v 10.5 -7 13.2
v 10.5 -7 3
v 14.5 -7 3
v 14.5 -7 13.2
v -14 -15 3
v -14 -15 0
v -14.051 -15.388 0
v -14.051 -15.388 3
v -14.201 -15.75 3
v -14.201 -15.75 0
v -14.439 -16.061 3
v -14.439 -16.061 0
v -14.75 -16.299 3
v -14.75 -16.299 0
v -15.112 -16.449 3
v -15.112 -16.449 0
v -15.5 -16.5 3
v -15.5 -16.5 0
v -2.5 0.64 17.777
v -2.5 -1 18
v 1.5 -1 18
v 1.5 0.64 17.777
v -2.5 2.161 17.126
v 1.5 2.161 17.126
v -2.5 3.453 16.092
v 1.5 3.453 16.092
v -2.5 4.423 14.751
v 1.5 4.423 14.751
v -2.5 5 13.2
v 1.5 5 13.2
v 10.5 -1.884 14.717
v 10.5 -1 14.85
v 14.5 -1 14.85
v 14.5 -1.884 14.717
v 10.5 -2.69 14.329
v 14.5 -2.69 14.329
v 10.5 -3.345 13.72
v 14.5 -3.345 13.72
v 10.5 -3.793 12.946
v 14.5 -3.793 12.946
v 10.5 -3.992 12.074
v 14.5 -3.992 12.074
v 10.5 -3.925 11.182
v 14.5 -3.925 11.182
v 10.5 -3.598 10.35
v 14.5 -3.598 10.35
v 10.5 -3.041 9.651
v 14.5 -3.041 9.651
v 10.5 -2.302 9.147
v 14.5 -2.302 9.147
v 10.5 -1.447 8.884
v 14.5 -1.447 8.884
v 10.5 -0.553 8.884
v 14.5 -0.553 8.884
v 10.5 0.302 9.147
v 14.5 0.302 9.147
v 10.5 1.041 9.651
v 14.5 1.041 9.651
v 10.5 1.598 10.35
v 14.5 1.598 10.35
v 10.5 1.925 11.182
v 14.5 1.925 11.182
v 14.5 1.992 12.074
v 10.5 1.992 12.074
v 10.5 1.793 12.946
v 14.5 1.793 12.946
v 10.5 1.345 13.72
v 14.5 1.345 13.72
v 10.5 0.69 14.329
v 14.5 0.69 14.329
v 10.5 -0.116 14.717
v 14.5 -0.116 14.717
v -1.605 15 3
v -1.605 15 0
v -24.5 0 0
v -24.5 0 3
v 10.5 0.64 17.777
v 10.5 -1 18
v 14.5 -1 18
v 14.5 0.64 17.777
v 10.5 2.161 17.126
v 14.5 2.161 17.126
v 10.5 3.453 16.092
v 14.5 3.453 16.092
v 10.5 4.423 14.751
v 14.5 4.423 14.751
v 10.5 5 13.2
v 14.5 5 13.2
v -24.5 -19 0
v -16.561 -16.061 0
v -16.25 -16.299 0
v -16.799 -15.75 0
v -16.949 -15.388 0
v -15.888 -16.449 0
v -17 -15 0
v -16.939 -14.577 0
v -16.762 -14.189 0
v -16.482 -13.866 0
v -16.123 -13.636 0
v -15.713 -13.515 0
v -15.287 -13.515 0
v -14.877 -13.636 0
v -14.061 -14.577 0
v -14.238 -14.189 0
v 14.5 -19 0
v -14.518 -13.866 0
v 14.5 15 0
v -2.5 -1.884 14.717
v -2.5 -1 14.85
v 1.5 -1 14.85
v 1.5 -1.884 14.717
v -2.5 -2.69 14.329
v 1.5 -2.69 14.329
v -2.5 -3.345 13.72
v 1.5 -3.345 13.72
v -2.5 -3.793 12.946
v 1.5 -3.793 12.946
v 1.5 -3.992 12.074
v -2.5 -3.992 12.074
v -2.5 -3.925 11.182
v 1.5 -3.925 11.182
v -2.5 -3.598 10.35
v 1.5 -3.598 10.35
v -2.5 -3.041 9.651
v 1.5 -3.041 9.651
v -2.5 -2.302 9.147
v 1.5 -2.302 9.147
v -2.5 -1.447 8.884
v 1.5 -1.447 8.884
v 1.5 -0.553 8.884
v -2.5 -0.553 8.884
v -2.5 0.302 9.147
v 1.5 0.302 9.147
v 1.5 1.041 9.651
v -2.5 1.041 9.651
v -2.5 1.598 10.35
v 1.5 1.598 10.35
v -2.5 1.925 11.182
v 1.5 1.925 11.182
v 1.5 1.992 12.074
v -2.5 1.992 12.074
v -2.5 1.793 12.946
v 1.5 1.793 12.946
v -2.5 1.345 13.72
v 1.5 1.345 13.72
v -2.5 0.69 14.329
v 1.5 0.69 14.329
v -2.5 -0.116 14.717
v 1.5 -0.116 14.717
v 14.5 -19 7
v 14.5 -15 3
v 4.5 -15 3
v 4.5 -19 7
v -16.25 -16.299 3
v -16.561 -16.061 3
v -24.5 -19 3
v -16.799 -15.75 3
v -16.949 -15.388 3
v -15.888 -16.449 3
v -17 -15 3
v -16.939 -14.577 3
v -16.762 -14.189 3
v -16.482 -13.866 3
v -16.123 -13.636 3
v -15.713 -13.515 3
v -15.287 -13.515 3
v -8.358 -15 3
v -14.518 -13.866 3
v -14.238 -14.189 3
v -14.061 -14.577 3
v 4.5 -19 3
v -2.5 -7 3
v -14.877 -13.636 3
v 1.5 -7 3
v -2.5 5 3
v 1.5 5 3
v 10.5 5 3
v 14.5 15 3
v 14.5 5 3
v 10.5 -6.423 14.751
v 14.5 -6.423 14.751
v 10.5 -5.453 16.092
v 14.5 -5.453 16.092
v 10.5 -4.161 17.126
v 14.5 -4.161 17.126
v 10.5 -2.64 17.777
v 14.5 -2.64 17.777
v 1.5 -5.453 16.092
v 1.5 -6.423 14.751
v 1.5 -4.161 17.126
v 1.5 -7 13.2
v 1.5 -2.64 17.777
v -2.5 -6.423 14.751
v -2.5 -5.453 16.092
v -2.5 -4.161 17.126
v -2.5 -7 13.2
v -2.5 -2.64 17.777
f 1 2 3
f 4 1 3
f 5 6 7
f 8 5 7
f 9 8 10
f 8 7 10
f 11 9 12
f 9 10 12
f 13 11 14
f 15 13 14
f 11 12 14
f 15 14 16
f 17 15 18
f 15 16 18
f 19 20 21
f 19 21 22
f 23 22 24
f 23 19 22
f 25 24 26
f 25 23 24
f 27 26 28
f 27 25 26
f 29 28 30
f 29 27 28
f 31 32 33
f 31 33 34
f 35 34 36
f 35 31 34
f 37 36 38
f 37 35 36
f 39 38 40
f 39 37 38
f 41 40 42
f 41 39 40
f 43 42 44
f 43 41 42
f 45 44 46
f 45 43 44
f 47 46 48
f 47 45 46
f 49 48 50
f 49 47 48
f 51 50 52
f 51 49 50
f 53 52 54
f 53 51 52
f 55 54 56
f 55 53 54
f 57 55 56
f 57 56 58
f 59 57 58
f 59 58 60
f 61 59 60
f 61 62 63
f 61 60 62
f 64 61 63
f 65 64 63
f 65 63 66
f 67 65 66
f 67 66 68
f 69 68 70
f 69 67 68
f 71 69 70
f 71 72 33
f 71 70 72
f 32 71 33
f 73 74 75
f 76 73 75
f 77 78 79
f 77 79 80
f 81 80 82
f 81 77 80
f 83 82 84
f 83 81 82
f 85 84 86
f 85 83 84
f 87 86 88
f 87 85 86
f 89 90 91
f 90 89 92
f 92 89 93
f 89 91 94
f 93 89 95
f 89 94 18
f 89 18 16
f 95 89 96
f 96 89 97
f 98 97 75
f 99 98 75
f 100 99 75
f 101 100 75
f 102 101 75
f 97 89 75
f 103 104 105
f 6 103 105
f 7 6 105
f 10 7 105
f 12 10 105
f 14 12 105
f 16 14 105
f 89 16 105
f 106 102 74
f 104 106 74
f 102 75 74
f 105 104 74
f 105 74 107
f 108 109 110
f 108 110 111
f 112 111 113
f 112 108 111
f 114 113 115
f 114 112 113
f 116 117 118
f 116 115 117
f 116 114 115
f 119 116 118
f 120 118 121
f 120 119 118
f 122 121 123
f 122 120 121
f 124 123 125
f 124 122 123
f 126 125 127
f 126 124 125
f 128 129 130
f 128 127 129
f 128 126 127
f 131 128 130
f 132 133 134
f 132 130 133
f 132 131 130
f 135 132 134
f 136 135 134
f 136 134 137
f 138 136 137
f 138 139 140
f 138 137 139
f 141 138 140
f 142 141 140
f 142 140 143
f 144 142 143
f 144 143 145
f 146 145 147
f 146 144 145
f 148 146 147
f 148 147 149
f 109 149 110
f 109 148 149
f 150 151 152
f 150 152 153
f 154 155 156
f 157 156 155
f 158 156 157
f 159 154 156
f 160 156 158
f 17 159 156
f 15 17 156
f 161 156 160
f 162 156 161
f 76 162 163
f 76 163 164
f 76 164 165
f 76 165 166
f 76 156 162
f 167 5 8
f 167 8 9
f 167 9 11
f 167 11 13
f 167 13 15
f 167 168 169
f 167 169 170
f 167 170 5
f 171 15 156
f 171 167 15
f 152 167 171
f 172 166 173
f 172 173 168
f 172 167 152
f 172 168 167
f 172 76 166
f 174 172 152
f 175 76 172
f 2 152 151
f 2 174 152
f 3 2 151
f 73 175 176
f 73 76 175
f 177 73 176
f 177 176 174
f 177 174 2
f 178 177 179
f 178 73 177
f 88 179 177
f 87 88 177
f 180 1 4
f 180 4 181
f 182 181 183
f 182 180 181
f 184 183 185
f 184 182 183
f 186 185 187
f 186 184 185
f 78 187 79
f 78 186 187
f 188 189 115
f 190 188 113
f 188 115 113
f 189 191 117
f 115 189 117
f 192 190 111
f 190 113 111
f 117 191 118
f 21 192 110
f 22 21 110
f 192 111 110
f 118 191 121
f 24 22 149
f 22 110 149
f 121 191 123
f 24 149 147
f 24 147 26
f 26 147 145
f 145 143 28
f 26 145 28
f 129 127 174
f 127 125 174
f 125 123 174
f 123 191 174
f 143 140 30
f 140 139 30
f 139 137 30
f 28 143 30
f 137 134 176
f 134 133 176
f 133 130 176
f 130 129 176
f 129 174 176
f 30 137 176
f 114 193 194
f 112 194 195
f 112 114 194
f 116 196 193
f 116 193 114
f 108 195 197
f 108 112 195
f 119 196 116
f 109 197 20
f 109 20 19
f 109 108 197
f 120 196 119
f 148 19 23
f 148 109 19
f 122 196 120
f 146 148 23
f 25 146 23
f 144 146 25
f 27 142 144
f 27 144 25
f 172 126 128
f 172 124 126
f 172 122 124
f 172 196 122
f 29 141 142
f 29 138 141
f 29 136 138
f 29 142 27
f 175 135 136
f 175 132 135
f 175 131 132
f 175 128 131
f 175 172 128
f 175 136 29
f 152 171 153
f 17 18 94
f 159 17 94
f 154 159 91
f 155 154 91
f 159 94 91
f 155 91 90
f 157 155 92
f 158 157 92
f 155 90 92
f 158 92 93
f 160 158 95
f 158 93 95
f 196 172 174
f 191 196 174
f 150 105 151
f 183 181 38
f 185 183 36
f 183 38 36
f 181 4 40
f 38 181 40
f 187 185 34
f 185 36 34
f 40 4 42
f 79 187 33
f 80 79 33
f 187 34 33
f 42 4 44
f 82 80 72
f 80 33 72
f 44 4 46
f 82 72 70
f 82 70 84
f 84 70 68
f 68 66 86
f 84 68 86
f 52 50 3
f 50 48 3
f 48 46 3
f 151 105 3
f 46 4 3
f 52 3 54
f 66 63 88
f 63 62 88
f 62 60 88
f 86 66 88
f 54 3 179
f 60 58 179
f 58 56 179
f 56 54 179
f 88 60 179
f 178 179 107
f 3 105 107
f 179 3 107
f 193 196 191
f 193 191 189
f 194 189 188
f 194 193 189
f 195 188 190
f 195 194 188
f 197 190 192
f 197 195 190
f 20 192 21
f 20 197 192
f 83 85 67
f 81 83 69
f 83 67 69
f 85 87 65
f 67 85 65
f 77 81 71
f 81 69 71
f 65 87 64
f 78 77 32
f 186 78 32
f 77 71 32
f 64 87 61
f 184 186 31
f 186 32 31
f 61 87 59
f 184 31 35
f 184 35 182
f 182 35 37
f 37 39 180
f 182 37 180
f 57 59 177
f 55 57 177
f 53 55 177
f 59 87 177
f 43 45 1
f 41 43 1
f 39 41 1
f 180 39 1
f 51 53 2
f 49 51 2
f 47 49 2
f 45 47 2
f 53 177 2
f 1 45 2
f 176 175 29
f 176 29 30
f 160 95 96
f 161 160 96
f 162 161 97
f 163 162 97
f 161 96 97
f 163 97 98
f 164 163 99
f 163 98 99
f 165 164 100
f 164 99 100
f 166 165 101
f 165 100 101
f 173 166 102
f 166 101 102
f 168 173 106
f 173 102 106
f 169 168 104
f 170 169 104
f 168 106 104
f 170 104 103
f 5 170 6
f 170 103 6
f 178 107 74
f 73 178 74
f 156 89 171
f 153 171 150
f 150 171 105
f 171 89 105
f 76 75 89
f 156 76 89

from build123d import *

# Parameters (mm, degrees)
ESBO_O1_W                  = 10
ESBO_O1_H                  = 4
RESSALTO_EXTRUS_O1_DEPTH   = 3
ESBO_O1_8_W                = 4
ESBO_O1_8_H                = 12
RESSALTO_EXTRUS_O2_DEPTH   = 18
CORTE_EXTRUS_O1_DEPTH      = 47.968074263
CORTE_EXTRUS_O1_DEPTH_BACK = 47.968074263
ESBO_O2_R                  = 3
ESBO_O1_9_W                = 10
ESBO_O1_9_H                = 4
RESSALTO_EXTRUS_O3_DEPTH   = 8
CHANFRO1_SIZE              = 5


with BuildPart() as part:
    # Esboço1 → Ressalto-extrusão1 (new body)
    # profile 1 of 2: a face of its own
    with BuildSketch(Plane.XY):
        Polygon((-24.5, -15), (-24.5, -19), (-15.5, -19), (4.5, -19), (4.5, -15), (14.5, -15), (14.5, -7), (10.5, -7), (10.5, 5), (14.5, 5), (14.5, 15), (1.5, 15), (-1.605263158, 15), (-24.5, 0), align=None)
        with BuildLine():
            ThreePointArc((-15.5, -16.5), (-16.560660172, -16.060660172), (-17, -15))
            ThreePointArc((-17, -15), (-15.5, -13.5), (-14, -15))
            ThreePointArc((-14, -15), (-14.439339828, -16.060660172), (-15.5, -16.5))
        make_face(mode=Mode.SUBTRACT)
        Polygon((-2.5, 5), (1.5, 5), (1.5, -7), (-2.5, -7), (-2.5, 0), align=None, mode=Mode.SUBTRACT)
    # profile 2 of 2: a face of its own
    with BuildSketch(Plane.XY):
        with Locations((9.5, -17)):
            Rectangle(ESBO_O1_W, ESBO_O1_H)
    extrude(amount=RESSALTO_EXTRUS_O1_DEPTH)

    # Esboço1<8> → Ressalto-extrusão2 (add)
    with BuildSketch(Plane.XY):
        Polygon((10.5, -7), (14.5, -7), (14.5, -2), (14.5, 5), (10.5, 5), align=None)
        with Locations((-0.5, -1)):
            Rectangle(ESBO_O1_8_W, ESBO_O1_8_H)
    extrude(amount=RESSALTO_EXTRUS_O2_DEPTH)

    # Esboço2 → Corte-extrusão1 (cut, two sides: drawn at the far end of the back side and taken through both)
    with BuildSketch(Plane(origin=(14.5, 0, 0), x_dir=(0, 0, -1), z_dir=(1, 0, 0)).offset(-CORTE_EXTRUS_O1_DEPTH_BACK)):
        with BuildLine():
            ThreePointArc((-18, -1), (-16.652343178, 2.841874542), (-13.2, 5))
            Line((-13.2, 5), (-18, 5))
            Line((-18, 5), (-18, -1))
        make_face()
        with BuildLine():
            ThreePointArc((-13.2, -7), (-16.652343178, -4.841874542), (-18, -1))
            Line((-18, -1), (-18, -7))
            Line((-18, -7), (-13.2, -7))
        make_face()
        with Locations(Location((-11.85, -1, 0), (0, 0, 180))):
            Circle(ESBO_O2_R)
    extrude(amount=CORTE_EXTRUS_O1_DEPTH + CORTE_EXTRUS_O1_DEPTH_BACK, mode=Mode.SUBTRACT)

    # Esboço1<9> → Ressalto-extrusão3 (add)
    with BuildSketch(Plane.XY):
        with Locations((9.5, -17)):
            Rectangle(ESBO_O1_9_W, ESBO_O1_9_H)
    extrude(amount=RESSALTO_EXTRUS_O3_DEPTH)

    # Chanfro1
    # the kernel refuses this chamfer: 5 mm, written as the material it takes off along each edge
    with BuildSketch(Plane(origin=(27.35841494, -15, 8), x_dir=(0, 0.027495876610586317, -0.9996219169112968), z_dir=(-1, 0, 0))) as chanfro1_piece_1_section:
        Polygon((CHANFRO1_SIZE * 0.999621916911, CHANFRO1_SIZE * 0.0274958766106), (-CHANFRO1_SIZE * 0.0274958766106, CHANFRO1_SIZE * 0.999621916911), (0, 0), align=None)
    chanfro1_piece_1 = extrude(amount=35.71682988, mode=Mode.PRIVATE)
    chanfro1_piece_1 = split(chanfro1_piece_1, bisect_by=Plane(origin=(9.5, -16.652020772, 3), z_dir=(0, 0, 1)), keep=Keep.TOP, mode=Mode.PRIVATE)
    add(chanfro1_piece_1, mode=Mode.SUBTRACT)


solid = part.part
